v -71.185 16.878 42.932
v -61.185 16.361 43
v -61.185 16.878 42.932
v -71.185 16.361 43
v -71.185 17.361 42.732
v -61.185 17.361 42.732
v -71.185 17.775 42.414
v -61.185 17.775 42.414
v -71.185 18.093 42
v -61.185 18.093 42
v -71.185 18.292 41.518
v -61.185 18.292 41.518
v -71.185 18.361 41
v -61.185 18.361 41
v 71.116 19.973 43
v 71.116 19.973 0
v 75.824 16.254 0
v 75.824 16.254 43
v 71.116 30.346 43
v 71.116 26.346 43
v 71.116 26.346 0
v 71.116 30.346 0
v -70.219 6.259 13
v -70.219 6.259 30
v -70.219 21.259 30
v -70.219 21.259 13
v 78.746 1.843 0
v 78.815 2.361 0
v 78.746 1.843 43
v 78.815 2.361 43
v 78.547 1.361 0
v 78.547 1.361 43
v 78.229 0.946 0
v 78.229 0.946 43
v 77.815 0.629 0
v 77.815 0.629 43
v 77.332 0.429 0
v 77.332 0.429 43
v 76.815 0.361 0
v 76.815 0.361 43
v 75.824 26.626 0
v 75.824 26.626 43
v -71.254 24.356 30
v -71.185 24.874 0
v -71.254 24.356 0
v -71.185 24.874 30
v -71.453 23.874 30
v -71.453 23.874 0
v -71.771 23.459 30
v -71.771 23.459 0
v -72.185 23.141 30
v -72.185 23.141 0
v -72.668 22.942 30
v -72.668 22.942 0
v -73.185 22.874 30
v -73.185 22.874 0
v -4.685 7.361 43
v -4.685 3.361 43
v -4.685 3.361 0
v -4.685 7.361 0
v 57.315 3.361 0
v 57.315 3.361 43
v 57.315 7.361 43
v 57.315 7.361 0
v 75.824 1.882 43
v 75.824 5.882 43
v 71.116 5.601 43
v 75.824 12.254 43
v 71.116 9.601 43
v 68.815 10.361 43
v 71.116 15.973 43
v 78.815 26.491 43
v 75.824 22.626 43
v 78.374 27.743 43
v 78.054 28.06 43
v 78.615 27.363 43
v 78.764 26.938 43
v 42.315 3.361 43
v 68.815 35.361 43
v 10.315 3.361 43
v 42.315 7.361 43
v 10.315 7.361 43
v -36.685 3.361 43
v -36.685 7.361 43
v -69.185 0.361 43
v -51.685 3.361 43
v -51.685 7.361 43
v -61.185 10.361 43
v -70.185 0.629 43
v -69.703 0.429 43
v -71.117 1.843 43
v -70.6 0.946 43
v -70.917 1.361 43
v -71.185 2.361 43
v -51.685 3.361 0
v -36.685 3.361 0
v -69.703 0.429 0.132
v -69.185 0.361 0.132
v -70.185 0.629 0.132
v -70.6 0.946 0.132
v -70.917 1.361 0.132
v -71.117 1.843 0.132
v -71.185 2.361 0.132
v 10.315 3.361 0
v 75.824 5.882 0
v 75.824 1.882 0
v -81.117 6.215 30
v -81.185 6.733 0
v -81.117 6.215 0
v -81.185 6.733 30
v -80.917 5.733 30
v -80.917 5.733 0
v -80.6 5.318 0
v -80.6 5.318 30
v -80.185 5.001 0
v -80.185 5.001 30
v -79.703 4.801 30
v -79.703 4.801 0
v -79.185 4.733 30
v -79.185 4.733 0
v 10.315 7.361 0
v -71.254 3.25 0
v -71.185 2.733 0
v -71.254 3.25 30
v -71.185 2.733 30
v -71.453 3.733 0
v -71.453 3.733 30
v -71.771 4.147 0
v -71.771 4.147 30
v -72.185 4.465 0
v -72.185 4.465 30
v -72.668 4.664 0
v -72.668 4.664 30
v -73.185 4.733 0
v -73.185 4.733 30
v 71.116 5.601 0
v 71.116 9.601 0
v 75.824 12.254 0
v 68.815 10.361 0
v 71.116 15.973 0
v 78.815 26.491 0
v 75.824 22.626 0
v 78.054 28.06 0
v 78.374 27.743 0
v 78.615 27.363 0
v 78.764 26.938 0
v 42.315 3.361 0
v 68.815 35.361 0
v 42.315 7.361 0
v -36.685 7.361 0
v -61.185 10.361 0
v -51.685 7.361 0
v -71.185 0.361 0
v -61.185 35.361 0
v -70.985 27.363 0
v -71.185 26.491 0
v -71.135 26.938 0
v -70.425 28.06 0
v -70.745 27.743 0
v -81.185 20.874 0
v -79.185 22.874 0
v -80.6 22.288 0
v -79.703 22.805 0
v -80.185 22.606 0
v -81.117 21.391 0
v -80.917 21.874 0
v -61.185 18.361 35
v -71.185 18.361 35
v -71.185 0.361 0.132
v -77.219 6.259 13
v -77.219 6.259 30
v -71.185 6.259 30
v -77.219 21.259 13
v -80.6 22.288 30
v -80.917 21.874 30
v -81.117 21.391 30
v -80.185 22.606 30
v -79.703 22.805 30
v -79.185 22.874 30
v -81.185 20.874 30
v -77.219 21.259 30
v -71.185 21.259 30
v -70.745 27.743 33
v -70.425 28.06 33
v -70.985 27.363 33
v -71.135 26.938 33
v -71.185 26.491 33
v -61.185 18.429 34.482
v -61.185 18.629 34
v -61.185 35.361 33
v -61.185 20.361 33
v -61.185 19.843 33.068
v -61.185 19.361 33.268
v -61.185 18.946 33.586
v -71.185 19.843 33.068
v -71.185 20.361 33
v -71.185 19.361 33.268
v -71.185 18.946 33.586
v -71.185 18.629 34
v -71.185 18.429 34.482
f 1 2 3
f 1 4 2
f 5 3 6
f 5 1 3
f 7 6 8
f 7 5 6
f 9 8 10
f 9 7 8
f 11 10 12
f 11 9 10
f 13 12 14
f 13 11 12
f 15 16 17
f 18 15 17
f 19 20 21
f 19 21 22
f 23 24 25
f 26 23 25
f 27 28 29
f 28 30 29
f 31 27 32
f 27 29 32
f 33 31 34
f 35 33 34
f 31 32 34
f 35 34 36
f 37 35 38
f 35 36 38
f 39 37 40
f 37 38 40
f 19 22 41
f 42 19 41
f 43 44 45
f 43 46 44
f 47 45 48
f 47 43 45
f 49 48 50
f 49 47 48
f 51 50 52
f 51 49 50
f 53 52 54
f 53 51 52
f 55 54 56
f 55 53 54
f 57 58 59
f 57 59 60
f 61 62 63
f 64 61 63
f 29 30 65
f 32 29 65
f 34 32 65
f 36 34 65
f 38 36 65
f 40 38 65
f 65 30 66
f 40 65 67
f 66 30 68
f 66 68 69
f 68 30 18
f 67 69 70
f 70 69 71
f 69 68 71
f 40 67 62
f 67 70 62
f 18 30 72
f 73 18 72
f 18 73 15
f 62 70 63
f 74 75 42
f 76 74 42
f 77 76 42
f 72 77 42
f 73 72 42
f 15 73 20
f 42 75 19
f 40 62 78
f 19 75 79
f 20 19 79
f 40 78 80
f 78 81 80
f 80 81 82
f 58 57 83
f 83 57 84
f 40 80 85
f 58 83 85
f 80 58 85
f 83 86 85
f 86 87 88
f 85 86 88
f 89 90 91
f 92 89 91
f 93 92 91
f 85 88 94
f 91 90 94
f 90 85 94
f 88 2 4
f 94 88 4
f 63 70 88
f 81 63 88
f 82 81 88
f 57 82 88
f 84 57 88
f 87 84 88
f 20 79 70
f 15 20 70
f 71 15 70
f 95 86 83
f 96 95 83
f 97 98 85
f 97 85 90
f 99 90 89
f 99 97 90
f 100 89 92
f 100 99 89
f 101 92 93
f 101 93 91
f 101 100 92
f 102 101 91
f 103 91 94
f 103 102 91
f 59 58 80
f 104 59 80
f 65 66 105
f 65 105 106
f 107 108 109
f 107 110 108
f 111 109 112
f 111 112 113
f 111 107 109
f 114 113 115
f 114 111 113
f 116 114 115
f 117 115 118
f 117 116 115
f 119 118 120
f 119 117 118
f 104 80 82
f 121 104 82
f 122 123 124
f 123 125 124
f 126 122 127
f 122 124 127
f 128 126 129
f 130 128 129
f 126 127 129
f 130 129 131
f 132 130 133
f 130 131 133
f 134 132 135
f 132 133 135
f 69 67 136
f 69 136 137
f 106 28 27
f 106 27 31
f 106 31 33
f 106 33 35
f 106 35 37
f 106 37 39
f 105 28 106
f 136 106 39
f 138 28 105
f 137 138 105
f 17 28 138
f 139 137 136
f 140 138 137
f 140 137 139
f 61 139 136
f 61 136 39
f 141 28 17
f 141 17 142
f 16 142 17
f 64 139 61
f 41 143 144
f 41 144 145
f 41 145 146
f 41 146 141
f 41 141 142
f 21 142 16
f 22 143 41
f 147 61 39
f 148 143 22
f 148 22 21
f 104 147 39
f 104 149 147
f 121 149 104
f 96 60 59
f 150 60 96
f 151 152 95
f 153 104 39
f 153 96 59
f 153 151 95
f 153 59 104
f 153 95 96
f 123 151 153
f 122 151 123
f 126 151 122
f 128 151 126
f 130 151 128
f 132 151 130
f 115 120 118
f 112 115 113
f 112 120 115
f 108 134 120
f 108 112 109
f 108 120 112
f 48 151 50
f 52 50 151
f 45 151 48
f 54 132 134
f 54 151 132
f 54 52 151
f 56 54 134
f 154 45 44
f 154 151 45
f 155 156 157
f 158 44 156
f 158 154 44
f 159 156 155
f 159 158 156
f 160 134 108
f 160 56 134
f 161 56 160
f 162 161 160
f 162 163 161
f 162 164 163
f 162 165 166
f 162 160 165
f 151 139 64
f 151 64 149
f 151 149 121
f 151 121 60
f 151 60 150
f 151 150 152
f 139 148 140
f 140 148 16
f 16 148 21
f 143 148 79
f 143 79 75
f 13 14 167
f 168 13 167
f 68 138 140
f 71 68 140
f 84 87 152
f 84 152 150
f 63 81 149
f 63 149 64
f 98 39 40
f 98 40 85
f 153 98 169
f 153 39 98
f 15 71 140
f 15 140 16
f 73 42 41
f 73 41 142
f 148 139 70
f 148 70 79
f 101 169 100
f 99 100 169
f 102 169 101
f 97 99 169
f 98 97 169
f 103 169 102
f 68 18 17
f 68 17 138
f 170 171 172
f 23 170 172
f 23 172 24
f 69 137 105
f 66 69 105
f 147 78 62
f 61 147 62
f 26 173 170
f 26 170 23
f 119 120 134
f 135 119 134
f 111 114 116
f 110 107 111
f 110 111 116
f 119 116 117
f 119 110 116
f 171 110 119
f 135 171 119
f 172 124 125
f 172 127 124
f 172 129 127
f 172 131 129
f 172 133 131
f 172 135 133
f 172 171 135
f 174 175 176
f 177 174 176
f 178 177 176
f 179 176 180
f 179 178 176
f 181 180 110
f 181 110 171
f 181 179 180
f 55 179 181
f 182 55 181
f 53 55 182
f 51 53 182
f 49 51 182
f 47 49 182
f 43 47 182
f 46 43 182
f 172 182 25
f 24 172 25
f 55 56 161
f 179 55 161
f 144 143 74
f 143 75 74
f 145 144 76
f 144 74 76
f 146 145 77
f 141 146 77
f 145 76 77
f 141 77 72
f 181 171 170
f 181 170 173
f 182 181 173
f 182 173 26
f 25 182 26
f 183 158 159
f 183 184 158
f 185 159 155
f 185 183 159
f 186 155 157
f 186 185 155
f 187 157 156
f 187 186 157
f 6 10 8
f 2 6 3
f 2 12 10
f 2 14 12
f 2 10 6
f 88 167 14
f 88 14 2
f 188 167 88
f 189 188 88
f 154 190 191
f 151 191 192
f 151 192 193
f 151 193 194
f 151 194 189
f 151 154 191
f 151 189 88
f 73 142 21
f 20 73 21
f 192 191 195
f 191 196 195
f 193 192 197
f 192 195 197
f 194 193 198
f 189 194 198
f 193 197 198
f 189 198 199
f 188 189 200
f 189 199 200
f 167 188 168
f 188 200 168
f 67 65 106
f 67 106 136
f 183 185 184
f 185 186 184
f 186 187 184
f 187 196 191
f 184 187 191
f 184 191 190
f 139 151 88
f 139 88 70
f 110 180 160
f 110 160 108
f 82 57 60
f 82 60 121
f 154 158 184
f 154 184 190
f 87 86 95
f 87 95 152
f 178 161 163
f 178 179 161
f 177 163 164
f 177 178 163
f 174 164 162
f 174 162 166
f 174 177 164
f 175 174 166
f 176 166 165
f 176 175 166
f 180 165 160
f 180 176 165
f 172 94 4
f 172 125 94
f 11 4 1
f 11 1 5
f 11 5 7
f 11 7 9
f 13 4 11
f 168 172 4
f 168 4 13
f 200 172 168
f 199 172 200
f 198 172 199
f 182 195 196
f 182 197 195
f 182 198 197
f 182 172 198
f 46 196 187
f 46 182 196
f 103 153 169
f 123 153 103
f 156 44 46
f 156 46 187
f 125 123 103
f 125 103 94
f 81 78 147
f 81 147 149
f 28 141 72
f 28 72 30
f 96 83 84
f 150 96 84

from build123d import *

# Parameters (mm, degrees)
EXTRUDE_1_DEPTH     = 43
SKETCH_2_W          = 10
SKETCH_2_H          = 17
CUT_EXTRUDE_1_DEPTH = 43
EXTRUDE_2_DEPTH     = 30
SKETCH_5_W          = 15
SKETCH_5_H          = 4
CUT_EXTRUDE_3_DEPTH = 99.440034066
CUT_EXTRUDE_4_DEPTH = 99.440034066
FILLET_1_R          = 2
FILLET_START        = 0.132447056
FILLET_2_DEPTH      = 43.867552944
FILLET_3_R          = 2
SKETCH_7_W          = 7
SKETCH_7_H          = 15
CUT_EXTRUDE_5_DEPTH = 17
FILLET_4_R          = 2


with BuildPart() as part:
    # Эскиз1 → Бобышка-Вытянуть1 (new body)
    with BuildSketch(Plane.XY):
        Polygon((-61.18540146, 10.360583942), (68.81459854, 10.360583942), (68.81459854, 35.360583942), (78.81459854, 27.459854015), (78.81459854, 0.360583942), (-71.18540146, 0.360583942), (-71.18540146, 27.459854015), (-61.18540146, 35.360583942), align=None)
    extrude(amount=EXTRUDE_1_DEPTH)

    # Эскиз2 → Вырез-Вытянуть1 (cut)
    with BuildSketch(Plane(origin=(-61.18540146, 0, 0), x_dir=(0, 0, -1), z_dir=(1, 0, 0))):
        with Locations((-38, 26.860583942)):
            Rectangle(SKETCH_2_W, SKETCH_2_H)
    extrude(amount=-CUT_EXTRUDE_1_DEPTH, mode=Mode.SUBTRACT)

    # Эскиз3 → Бобышка-Вытянуть2 (add)
    with BuildSketch(Plane.XY):
        Polygon((-71.18540146, 18.360583942), (-71.18540146, 22.873529361), (-81.18540146, 22.873529361), (-81.18540146, 18.360583942), (-81.18540146, 4.73264295), (-71.18540146, 4.73264295), align=None)
    extrude(amount=EXTRUDE_2_DEPTH)

    # Эскиз5 → Вырез-Вытянуть3 (cut, through all)
    with BuildSketch(Plane.XY.offset(43)):
        with Locations((2.81459854, 5.360583942)):
            Rectangle(SKETCH_5_W, SKETCH_5_H)
        with Locations((-44.18540146, 5.360583942)):
            Rectangle(SKETCH_5_W, SKETCH_5_H)
        with Locations((49.81459854, 5.360583942)):
            Rectangle(SKETCH_5_W, SKETCH_5_H)
    extrude(amount=-CUT_EXTRUDE_3_DEPTH, mode=Mode.SUBTRACT)

    # Эскиз6 → Вырез-Вытянуть4 (cut, through all)
    with BuildSketch(Plane.XY.offset(43)):
        Polygon((71.115819654, 30.345691142), (75.823743696, 26.626087505), (75.823743696, 22.626087505), (71.115819654, 26.345691142), align=None)
        Polygon((71.115819654, 19.973455793), (75.823743696, 16.253852156), (75.823743696, 12.253852156), (71.115819654, 15.973455793), align=None)
        Polygon((71.115819654, 9.601220443), (75.823743696, 5.881616806), (75.823743696, 1.881616806), (71.115819654, 5.601220443), align=None)
    extrude(amount=-CUT_EXTRUDE_4_DEPTH, mode=Mode.SUBTRACT)

    # Скругление1
    fillet_1_edges = [part.edges().sort_by_distance(p)[0] for p in [
        (78.81459854, 27.459854015, 21.5),
        (78.81459854, 0.360583942, 21.5),
        (-71.18540146, 27.459854015, 16.5),
    ]]
    fillet(fillet_1_edges, radius=FILLET_1_R)

    # Скругление2: read off the stored shape, not the designer's step
    # Скругление2 outline → Скругление2 (cut)
    with BuildSketch(Plane.XY.offset(FILLET_START)):
        with BuildLine():
            Line((-71.18540146, 0.360583942), (-69.18540146, 0.360583942))
            ThreePointArc((-69.18540146, 0.360583942), (-70.599615022, 0.94637038), (-71.18540146, 2.360583942))
            Line((-71.18540146, 2.360583942), (-71.18540146, 0.360583942))
        make_face()
    extrude(amount=FILLET_2_DEPTH, mode=Mode.SUBTRACT)

    # Скругление3
    fillet_3_edges = [part.edges().sort_by_distance(p)[0] for p in [
        (-66.18540146, 18.360583942, 43),
        (-66.18540146, 18.360583942, 33),
    ]]
    fillet(fillet_3_edges, radius=FILLET_3_R)

    # Эскиз7 → Вырез-Вытянуть5 (cut)
    with BuildSketch(Plane.XY.offset(30)):
        with Locations((-73.719422713, 13.759023225)):
            Rectangle(SKETCH_7_W, SKETCH_7_H)
    extrude(amount=-CUT_EXTRUDE_5_DEPTH, mode=Mode.SUBTRACT)

    # Скругление4
    fillet_4_edges = [part.edges().sort_by_distance(p)[0] for p in [
        (-81.18540146, 4.73264295, 15),
        (-71.18540146, 4.73264295, 15),
        (-71.18540146, 22.873529361, 15),
        (-81.18540146, 22.873529361, 15),
    ]]
    fillet(fillet_4_edges, radius=FILLET_4_R)


solid = part.part
